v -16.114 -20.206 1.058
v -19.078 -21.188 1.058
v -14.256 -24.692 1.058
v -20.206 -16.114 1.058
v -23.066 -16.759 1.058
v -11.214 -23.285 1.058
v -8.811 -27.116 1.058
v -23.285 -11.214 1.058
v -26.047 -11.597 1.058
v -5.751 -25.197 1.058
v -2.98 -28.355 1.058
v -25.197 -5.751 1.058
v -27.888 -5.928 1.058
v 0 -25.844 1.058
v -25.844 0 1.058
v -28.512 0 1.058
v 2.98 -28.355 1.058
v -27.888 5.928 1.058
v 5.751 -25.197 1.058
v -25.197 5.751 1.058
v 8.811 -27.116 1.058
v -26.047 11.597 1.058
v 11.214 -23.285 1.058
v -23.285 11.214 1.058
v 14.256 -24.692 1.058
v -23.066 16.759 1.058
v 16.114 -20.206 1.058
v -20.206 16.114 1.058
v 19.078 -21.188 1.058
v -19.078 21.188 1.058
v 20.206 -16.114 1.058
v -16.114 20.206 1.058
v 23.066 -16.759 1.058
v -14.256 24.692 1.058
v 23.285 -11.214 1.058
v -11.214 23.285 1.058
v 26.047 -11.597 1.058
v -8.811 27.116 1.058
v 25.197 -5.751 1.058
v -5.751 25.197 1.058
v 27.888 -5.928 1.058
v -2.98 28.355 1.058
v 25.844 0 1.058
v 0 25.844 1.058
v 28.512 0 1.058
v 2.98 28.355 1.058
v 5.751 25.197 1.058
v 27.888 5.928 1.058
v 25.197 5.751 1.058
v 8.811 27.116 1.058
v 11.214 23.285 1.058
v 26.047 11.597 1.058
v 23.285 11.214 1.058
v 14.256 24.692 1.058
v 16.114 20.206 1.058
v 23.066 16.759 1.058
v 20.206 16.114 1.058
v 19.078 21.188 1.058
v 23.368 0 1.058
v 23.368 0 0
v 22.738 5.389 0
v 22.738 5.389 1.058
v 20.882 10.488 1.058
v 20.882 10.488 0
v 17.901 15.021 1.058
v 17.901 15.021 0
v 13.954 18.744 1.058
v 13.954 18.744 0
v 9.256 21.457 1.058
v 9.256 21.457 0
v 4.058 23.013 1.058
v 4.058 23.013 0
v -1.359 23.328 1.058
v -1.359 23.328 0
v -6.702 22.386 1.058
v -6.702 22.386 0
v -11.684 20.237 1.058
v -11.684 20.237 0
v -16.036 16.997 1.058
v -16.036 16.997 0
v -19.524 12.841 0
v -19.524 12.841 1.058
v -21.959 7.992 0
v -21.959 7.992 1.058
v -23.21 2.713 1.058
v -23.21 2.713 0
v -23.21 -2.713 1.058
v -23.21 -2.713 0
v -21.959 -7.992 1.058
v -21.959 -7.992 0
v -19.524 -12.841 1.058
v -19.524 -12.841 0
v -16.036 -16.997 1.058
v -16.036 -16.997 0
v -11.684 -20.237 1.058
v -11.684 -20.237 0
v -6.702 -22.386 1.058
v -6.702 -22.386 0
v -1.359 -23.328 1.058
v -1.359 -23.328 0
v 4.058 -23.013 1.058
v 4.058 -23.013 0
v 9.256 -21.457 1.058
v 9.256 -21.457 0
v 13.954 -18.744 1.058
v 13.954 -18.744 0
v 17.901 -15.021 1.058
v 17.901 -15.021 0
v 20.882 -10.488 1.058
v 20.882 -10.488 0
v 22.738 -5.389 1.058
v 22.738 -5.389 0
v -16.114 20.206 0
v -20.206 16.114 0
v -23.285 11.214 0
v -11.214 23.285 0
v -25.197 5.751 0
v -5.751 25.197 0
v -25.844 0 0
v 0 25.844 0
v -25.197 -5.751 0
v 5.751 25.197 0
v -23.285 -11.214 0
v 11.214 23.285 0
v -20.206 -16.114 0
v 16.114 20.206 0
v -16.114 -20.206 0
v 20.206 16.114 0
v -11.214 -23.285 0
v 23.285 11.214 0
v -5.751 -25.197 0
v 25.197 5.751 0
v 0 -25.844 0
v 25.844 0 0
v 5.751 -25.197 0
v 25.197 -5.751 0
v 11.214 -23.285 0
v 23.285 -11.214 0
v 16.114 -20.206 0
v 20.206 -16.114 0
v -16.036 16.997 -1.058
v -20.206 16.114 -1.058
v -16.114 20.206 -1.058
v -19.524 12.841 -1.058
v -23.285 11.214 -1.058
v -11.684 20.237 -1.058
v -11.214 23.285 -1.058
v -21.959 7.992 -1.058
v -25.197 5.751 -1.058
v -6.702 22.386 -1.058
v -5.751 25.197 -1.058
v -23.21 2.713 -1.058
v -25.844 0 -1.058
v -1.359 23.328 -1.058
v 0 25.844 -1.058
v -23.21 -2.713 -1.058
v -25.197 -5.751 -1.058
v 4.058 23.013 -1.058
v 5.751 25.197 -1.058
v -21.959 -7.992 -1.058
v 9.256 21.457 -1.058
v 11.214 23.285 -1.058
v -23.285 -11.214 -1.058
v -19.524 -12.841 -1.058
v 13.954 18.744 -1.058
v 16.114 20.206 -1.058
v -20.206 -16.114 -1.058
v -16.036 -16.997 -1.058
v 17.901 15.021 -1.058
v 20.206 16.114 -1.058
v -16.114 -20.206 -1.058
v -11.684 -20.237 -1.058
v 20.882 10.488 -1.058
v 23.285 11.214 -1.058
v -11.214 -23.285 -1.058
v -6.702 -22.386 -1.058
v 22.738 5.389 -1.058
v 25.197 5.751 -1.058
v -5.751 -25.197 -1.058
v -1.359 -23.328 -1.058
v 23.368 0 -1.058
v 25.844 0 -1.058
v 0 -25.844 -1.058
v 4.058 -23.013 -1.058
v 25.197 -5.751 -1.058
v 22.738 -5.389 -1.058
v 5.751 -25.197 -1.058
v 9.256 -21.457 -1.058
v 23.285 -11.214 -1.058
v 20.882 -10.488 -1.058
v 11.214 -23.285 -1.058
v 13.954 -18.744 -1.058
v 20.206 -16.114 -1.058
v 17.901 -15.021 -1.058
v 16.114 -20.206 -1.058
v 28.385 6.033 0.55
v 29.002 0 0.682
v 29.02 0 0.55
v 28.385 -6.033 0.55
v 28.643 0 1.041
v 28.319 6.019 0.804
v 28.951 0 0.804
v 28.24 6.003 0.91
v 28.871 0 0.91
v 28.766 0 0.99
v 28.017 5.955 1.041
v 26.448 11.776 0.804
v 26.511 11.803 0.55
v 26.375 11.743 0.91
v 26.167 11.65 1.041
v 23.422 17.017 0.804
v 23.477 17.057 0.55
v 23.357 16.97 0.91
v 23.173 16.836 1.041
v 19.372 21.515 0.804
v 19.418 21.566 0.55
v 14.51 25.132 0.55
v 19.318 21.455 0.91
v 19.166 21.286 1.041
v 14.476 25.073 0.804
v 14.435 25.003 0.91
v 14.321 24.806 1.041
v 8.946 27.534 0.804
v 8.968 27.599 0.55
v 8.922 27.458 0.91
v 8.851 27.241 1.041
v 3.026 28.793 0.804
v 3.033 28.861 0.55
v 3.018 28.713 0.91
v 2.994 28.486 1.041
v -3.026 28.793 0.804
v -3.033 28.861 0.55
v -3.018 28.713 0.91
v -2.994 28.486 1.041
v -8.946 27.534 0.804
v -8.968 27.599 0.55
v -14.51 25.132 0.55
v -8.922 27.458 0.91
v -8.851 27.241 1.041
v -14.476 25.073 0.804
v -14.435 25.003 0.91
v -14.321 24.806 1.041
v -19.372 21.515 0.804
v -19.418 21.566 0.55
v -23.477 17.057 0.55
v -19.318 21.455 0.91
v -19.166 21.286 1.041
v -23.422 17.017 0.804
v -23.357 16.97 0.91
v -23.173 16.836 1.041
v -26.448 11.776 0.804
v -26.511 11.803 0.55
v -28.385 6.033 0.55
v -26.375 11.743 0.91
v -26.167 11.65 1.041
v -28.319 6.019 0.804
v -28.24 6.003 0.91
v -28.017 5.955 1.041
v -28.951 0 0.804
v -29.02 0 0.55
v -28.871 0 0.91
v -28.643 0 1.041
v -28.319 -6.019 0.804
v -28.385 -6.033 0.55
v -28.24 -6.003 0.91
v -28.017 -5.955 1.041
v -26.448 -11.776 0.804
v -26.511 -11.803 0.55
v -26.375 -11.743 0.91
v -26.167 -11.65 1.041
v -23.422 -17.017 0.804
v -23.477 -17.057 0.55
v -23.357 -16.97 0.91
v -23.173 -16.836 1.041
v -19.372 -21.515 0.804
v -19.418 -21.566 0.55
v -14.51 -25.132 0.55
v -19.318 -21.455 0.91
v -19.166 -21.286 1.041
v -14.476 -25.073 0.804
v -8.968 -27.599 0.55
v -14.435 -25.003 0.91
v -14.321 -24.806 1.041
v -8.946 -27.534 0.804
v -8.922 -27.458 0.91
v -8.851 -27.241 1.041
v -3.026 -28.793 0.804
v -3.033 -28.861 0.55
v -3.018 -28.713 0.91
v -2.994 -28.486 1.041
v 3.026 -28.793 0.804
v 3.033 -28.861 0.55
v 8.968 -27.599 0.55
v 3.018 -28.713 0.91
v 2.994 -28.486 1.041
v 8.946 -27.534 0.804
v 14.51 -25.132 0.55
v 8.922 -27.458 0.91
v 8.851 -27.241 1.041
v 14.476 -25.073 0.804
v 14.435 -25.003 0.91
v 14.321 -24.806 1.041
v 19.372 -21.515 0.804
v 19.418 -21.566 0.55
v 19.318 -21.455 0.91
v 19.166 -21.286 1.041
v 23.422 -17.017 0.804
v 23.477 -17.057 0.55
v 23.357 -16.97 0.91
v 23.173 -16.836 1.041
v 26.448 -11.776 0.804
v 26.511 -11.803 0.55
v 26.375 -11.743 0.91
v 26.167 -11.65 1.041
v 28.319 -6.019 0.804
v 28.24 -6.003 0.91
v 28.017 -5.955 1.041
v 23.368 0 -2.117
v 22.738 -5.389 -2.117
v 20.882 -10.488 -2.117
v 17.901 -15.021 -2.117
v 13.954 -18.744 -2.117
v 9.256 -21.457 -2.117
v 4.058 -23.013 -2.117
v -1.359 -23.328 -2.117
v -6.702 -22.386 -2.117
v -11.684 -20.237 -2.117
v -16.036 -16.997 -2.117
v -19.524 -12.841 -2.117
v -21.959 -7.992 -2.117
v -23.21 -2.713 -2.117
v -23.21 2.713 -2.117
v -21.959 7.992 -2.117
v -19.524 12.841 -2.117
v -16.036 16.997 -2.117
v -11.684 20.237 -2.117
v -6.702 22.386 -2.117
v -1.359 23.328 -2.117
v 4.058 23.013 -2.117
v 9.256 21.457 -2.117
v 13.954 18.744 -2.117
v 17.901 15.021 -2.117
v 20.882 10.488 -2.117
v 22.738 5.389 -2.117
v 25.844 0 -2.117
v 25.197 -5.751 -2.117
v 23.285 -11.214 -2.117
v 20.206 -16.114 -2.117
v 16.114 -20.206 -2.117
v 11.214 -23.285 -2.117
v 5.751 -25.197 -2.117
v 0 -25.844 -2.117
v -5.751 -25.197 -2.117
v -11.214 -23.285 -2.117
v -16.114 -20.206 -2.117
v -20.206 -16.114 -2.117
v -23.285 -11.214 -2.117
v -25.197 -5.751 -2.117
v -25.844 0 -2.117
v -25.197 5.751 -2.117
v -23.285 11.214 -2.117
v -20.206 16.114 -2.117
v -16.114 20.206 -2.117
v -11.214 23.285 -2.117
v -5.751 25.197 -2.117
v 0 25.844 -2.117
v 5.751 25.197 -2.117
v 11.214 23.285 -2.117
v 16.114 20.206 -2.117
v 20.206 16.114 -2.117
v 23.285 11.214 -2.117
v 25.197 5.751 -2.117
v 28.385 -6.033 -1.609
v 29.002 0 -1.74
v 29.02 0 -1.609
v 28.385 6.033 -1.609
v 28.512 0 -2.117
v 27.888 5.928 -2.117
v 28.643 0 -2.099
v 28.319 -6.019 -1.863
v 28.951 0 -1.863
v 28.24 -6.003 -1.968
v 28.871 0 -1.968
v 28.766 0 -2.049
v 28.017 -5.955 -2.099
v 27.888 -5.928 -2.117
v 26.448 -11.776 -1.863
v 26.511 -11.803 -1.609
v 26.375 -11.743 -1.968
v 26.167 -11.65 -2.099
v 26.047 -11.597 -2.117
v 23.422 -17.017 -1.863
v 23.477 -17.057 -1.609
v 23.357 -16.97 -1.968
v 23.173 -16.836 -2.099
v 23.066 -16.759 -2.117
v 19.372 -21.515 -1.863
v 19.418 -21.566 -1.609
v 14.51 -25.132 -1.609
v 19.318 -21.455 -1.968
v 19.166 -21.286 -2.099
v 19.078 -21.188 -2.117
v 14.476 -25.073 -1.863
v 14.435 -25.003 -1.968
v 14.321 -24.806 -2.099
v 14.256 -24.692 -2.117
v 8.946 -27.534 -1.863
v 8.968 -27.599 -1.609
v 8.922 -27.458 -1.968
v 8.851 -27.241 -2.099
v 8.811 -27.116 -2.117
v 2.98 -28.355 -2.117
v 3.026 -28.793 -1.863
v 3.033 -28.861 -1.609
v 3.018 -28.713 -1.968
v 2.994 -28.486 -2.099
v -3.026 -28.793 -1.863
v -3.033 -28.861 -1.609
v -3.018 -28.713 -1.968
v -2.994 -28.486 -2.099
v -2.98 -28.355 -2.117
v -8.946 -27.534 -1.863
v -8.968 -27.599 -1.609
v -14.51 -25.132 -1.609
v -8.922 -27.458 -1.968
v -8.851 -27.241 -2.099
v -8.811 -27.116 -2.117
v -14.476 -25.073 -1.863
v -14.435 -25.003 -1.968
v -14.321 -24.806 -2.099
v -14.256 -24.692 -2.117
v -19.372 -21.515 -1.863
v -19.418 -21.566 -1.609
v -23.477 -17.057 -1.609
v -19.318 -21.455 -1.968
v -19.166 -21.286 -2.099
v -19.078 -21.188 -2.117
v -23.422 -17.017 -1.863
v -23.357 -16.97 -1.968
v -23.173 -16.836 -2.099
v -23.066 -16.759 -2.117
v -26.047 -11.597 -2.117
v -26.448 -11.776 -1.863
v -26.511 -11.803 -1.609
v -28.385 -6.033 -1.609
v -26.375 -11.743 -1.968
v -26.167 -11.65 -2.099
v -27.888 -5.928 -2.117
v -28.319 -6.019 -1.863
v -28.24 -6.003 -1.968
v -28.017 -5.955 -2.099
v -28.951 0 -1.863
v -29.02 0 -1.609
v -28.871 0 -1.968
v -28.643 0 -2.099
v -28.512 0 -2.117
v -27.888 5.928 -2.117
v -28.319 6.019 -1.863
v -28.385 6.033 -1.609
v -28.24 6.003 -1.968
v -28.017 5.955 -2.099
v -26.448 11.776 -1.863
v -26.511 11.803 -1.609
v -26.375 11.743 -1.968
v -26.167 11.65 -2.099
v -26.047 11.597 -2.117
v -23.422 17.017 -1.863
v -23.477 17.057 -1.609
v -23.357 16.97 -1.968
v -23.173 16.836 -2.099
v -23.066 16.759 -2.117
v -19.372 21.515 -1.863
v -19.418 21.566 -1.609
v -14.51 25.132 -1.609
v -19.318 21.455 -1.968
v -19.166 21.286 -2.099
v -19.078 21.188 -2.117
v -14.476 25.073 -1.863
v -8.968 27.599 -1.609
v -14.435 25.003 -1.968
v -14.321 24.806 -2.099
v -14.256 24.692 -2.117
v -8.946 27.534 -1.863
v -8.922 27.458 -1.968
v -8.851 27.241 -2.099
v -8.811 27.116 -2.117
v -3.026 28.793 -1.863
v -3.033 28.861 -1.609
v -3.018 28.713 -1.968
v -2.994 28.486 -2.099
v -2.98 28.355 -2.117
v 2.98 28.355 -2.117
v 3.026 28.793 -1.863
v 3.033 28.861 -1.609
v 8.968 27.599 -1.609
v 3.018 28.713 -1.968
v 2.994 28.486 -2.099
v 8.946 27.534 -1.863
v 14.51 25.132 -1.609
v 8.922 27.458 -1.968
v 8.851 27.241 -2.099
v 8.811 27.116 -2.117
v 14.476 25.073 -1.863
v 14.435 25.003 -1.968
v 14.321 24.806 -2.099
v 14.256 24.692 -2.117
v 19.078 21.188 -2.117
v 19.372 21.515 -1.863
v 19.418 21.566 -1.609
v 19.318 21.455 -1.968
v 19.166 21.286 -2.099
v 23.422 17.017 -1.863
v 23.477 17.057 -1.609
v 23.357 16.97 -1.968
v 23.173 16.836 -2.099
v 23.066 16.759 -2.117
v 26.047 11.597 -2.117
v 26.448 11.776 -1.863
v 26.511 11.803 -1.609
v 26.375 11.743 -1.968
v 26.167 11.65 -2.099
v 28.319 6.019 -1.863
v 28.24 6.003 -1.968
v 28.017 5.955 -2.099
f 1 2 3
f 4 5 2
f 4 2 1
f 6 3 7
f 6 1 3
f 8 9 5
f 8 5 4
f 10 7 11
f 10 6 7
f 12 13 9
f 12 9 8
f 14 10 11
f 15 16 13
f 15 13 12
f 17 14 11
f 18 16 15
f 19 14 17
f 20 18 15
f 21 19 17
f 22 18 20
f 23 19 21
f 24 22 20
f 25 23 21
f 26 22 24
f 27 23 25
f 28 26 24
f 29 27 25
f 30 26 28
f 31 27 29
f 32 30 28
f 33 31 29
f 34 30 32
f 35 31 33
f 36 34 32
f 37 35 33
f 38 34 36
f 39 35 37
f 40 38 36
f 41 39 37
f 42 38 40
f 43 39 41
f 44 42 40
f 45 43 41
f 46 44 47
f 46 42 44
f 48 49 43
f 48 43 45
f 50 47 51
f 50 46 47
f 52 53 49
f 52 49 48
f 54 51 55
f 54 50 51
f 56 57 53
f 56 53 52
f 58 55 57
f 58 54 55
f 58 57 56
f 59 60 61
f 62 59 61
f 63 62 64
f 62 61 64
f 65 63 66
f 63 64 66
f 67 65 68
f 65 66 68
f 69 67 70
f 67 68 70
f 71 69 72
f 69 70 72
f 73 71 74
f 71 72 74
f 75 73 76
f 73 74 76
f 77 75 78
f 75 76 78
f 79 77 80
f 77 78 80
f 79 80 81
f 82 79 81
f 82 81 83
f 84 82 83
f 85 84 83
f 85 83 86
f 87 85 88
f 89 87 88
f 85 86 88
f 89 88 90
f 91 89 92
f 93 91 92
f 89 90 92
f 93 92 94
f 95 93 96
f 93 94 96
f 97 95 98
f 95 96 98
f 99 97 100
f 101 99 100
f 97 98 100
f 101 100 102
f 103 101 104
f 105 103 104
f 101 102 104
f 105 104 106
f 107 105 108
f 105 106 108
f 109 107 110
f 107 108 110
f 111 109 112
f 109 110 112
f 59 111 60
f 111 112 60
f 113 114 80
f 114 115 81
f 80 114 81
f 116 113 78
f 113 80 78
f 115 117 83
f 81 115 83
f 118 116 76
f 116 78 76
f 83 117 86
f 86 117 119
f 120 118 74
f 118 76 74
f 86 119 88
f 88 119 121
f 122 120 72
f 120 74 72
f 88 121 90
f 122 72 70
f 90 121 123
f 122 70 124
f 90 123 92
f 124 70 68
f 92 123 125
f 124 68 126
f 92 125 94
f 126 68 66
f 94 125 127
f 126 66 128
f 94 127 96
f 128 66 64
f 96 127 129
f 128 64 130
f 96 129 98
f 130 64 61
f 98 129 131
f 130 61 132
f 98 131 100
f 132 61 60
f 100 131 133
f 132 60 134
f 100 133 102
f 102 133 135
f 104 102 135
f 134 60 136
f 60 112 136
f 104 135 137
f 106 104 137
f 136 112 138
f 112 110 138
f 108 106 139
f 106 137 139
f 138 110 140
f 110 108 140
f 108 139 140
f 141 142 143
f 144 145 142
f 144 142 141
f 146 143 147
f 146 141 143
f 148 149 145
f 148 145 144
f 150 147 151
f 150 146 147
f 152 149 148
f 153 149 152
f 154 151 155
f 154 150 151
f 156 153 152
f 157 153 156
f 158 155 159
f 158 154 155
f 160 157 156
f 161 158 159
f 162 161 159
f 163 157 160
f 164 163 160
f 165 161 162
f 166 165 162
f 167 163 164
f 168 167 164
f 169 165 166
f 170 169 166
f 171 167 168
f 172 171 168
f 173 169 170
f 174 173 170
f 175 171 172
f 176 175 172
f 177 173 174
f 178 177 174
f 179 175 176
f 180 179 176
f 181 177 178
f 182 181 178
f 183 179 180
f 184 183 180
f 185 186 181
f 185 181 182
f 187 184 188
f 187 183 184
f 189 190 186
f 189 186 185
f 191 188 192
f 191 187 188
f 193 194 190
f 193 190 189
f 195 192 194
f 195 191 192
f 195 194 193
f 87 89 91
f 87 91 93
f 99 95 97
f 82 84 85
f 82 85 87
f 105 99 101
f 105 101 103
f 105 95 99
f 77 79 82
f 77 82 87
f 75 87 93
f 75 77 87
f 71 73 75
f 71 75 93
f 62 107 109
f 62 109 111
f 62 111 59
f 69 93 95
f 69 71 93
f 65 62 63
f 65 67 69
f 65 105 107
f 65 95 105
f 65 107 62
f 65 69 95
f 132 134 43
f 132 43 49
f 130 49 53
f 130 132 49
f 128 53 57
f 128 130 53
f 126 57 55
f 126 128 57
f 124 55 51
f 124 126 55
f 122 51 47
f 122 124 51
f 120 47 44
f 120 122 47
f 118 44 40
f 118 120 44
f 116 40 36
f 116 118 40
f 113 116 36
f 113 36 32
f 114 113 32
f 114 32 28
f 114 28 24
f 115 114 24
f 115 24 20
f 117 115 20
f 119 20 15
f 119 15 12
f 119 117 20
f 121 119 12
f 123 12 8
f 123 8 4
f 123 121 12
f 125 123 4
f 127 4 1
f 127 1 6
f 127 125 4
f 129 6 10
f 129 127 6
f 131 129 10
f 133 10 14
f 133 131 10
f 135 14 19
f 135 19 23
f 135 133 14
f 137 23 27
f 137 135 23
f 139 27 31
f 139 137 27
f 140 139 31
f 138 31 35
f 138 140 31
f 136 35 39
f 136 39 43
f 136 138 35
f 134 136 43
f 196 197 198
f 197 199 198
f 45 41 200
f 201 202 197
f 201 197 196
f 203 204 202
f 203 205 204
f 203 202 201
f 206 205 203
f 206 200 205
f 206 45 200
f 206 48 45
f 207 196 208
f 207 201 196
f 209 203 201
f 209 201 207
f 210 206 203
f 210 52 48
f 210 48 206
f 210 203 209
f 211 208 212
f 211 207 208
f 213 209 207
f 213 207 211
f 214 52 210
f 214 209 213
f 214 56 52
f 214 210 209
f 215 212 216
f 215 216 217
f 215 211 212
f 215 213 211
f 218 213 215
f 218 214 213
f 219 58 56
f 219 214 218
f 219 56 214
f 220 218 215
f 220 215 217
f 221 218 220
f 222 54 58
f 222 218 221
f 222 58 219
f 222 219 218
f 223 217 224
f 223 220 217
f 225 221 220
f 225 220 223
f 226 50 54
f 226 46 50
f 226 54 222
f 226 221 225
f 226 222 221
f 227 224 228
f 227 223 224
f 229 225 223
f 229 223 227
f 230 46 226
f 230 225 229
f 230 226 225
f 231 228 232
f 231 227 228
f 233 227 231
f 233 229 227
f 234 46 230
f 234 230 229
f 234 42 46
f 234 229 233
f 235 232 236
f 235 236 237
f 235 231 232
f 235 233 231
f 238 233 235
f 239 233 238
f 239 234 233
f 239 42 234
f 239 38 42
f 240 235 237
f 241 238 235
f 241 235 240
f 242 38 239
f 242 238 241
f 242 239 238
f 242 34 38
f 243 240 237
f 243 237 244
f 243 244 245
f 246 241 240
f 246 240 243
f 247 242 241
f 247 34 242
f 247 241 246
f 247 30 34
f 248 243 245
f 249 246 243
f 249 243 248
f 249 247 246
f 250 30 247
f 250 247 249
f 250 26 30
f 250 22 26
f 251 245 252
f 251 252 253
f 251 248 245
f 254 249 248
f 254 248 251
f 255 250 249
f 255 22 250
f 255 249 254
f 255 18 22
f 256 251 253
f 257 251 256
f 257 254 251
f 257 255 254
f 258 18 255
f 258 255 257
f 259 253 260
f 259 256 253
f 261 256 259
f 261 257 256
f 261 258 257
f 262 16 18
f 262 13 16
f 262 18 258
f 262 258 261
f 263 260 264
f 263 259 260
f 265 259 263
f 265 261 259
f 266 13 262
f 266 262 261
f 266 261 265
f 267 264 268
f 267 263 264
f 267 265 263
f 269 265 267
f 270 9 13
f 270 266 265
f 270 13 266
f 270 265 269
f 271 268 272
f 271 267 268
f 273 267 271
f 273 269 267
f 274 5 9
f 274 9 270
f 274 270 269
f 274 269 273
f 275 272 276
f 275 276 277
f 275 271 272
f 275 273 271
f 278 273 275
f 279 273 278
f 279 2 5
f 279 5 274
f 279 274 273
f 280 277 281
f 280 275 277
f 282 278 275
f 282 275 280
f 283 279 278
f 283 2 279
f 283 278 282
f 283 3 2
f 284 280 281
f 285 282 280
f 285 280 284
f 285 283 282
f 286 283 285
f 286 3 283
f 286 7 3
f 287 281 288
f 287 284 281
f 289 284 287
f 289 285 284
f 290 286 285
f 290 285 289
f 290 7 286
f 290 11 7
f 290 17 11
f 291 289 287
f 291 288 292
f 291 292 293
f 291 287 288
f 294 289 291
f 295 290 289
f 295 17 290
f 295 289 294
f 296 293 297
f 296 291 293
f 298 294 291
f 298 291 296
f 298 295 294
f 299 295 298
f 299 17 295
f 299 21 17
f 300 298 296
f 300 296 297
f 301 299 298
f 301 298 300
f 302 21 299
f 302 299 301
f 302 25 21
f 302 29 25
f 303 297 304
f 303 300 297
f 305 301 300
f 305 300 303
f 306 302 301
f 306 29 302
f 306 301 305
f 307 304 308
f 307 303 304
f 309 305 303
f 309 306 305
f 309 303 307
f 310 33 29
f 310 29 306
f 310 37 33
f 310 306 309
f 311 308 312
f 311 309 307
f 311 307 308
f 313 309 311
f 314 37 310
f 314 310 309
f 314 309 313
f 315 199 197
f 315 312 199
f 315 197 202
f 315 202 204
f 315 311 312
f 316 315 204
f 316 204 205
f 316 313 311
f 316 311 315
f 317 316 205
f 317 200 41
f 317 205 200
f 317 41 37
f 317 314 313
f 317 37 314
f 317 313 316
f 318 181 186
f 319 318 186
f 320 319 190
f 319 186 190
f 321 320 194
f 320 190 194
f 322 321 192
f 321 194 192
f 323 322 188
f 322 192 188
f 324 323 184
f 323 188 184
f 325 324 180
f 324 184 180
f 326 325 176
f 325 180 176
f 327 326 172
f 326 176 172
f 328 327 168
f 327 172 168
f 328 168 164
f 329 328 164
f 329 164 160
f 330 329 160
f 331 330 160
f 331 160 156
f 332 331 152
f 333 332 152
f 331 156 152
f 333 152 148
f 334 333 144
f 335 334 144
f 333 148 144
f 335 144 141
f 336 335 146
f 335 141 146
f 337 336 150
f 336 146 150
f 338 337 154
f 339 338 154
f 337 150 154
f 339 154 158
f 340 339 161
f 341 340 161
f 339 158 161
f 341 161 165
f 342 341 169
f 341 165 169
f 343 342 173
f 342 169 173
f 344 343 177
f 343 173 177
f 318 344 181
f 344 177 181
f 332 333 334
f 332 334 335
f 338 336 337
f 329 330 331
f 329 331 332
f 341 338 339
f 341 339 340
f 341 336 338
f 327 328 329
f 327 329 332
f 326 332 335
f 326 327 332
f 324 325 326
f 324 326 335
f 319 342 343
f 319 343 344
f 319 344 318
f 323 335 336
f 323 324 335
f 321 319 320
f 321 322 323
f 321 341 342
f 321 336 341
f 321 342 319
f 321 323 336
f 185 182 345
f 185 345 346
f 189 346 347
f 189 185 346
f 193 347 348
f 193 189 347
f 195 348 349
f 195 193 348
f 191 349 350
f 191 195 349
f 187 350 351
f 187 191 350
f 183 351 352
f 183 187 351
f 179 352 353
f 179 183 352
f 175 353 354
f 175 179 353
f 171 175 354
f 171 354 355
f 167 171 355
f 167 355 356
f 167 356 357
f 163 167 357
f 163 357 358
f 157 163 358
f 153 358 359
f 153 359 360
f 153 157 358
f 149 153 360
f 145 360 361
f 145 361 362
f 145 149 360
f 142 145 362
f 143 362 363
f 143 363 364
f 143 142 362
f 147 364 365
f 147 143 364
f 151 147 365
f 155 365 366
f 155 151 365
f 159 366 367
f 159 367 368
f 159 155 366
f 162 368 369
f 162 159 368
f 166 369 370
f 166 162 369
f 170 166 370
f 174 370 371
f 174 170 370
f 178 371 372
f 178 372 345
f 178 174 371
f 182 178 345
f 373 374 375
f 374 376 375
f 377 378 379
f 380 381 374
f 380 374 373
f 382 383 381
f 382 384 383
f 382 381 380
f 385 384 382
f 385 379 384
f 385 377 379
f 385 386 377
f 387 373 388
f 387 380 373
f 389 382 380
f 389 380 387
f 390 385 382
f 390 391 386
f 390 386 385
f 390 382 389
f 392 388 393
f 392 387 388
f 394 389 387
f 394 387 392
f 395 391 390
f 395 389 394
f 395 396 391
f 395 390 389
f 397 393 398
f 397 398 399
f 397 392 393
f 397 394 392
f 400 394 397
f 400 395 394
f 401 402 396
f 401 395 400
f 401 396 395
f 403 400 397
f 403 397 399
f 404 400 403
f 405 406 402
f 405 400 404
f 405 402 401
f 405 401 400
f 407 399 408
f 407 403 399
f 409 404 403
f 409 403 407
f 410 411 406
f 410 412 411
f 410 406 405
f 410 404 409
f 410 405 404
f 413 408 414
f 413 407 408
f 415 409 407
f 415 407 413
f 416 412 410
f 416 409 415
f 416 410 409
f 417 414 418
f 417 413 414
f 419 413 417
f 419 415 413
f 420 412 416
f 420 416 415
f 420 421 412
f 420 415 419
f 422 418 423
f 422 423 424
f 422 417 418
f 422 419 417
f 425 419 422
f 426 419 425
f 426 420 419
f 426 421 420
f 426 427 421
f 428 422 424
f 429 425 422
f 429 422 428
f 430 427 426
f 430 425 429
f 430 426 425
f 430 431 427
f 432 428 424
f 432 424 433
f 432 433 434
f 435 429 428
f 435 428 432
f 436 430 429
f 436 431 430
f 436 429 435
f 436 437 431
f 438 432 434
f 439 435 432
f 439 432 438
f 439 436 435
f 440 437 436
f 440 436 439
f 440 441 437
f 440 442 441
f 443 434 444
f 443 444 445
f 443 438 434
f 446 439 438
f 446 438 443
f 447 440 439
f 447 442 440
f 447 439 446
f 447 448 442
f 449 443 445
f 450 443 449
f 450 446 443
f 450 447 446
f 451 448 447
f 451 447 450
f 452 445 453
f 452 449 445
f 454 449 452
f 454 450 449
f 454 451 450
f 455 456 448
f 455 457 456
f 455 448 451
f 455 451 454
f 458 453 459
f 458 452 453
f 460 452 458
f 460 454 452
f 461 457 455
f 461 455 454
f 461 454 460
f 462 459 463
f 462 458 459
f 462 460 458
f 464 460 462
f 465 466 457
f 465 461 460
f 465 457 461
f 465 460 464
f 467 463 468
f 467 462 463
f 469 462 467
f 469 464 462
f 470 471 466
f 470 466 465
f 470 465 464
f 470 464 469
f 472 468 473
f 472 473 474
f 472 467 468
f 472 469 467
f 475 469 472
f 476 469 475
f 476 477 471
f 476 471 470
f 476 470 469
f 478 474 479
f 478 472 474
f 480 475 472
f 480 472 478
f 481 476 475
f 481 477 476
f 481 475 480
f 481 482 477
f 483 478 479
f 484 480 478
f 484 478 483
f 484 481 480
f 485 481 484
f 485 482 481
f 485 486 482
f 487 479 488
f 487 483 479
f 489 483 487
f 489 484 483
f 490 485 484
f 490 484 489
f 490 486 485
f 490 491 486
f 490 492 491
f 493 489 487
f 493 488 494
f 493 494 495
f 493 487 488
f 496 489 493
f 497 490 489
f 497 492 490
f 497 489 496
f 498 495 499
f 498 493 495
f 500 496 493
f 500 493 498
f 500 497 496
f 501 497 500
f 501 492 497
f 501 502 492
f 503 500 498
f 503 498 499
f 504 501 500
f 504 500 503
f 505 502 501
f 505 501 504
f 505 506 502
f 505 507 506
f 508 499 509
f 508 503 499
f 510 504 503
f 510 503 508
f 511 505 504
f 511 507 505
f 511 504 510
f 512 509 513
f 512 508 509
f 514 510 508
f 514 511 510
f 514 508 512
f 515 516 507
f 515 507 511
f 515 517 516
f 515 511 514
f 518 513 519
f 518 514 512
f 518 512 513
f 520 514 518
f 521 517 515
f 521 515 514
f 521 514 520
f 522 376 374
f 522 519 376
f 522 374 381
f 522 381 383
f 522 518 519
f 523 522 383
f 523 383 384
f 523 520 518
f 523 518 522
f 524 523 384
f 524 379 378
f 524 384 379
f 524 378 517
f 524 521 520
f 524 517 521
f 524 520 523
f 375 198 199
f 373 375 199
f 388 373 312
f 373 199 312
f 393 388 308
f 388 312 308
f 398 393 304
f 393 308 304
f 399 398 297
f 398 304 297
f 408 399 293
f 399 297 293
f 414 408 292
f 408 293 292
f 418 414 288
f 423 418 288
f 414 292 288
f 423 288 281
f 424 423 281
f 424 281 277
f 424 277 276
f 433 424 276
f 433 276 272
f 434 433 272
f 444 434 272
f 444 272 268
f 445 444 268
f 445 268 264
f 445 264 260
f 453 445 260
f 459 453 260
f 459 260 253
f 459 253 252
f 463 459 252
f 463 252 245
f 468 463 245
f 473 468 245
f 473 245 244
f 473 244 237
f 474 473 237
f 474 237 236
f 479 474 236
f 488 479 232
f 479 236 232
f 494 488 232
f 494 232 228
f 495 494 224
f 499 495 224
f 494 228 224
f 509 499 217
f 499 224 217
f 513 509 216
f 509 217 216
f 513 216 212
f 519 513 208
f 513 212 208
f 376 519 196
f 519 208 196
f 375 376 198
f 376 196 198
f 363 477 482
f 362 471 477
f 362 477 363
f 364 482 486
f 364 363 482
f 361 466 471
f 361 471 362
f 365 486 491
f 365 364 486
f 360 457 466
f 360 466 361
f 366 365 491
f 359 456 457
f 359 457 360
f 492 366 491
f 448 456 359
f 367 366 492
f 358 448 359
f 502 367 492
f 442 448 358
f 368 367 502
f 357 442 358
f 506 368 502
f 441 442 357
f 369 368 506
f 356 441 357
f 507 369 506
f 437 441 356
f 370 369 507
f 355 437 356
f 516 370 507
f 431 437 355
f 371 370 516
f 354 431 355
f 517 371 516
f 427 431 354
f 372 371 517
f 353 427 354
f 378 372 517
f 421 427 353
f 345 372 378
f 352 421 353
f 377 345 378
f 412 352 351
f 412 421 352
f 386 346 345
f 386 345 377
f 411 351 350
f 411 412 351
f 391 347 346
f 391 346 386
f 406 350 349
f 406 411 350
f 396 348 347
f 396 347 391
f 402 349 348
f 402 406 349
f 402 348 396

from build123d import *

# Parameters (mm, degrees)
F0_R     = 23.368
F1_DEPTH = 1.0583333333
F0_R_2   = 29.0195
F0_R_3   = 25.8445
F2_R     = 29.0195
F2_R_2   = 23.368
F3_DEPTH = 1.0583333333
F4_R     = 29.0195
F4_R_2   = 25.8445
F4_R_3   = 23.368
F5_DEPTH = 1.0583333333
F6_R     = 0.508


with BuildPart() as f1:
    # F0 (on Top) → F1 (new body)
    with BuildSketch(Plane.XY):
        Circle(F0_R)
    extrude(amount=F1_DEPTH)



with BuildPart() as f1b:
    # F0 (on Top) → F1, piece 2 (new body)
    with BuildSketch(Plane.XY):
        Circle(F0_R_2)
        Circle(F0_R_3, mode=Mode.SUBTRACT)
    extrude(amount=F1_DEPTH)


with BuildPart() as f1_1:
    add(f1.part)

    add(f1b.part)  # F3 merges F1b
    # F2 (on face) → F3 (join)
    with BuildSketch(Plane(origin=(0, 0, 0), x_dir=(1, 0, 0), z_dir=(0, 0, -1))):
        Circle(F2_R)
        Circle(F2_R_2, mode=Mode.SUBTRACT)
        Circle(F2_R_2)
    extrude(amount=F3_DEPTH)

    # F4 (on face) → F5 (join)
    with BuildSketch(Plane(origin=(0, 0, -1.0583333333), x_dir=(1, 0, 0), z_dir=(0, 0, -1))):
        Circle(F4_R)
        Circle(F4_R_2, mode=Mode.SUBTRACT)
        Circle(F4_R_3)
    extrude(amount=F5_DEPTH)

    # F6
    f6_edges = [f1_1.edges().sort_by_distance(p)[0] for p in [
        (-29.0195, 0, -2.116667),
        (-29.0195, 0, 1.058333),
    ]]
    fillet(f6_edges, radius=F6_R)


solid = f1_1.part
